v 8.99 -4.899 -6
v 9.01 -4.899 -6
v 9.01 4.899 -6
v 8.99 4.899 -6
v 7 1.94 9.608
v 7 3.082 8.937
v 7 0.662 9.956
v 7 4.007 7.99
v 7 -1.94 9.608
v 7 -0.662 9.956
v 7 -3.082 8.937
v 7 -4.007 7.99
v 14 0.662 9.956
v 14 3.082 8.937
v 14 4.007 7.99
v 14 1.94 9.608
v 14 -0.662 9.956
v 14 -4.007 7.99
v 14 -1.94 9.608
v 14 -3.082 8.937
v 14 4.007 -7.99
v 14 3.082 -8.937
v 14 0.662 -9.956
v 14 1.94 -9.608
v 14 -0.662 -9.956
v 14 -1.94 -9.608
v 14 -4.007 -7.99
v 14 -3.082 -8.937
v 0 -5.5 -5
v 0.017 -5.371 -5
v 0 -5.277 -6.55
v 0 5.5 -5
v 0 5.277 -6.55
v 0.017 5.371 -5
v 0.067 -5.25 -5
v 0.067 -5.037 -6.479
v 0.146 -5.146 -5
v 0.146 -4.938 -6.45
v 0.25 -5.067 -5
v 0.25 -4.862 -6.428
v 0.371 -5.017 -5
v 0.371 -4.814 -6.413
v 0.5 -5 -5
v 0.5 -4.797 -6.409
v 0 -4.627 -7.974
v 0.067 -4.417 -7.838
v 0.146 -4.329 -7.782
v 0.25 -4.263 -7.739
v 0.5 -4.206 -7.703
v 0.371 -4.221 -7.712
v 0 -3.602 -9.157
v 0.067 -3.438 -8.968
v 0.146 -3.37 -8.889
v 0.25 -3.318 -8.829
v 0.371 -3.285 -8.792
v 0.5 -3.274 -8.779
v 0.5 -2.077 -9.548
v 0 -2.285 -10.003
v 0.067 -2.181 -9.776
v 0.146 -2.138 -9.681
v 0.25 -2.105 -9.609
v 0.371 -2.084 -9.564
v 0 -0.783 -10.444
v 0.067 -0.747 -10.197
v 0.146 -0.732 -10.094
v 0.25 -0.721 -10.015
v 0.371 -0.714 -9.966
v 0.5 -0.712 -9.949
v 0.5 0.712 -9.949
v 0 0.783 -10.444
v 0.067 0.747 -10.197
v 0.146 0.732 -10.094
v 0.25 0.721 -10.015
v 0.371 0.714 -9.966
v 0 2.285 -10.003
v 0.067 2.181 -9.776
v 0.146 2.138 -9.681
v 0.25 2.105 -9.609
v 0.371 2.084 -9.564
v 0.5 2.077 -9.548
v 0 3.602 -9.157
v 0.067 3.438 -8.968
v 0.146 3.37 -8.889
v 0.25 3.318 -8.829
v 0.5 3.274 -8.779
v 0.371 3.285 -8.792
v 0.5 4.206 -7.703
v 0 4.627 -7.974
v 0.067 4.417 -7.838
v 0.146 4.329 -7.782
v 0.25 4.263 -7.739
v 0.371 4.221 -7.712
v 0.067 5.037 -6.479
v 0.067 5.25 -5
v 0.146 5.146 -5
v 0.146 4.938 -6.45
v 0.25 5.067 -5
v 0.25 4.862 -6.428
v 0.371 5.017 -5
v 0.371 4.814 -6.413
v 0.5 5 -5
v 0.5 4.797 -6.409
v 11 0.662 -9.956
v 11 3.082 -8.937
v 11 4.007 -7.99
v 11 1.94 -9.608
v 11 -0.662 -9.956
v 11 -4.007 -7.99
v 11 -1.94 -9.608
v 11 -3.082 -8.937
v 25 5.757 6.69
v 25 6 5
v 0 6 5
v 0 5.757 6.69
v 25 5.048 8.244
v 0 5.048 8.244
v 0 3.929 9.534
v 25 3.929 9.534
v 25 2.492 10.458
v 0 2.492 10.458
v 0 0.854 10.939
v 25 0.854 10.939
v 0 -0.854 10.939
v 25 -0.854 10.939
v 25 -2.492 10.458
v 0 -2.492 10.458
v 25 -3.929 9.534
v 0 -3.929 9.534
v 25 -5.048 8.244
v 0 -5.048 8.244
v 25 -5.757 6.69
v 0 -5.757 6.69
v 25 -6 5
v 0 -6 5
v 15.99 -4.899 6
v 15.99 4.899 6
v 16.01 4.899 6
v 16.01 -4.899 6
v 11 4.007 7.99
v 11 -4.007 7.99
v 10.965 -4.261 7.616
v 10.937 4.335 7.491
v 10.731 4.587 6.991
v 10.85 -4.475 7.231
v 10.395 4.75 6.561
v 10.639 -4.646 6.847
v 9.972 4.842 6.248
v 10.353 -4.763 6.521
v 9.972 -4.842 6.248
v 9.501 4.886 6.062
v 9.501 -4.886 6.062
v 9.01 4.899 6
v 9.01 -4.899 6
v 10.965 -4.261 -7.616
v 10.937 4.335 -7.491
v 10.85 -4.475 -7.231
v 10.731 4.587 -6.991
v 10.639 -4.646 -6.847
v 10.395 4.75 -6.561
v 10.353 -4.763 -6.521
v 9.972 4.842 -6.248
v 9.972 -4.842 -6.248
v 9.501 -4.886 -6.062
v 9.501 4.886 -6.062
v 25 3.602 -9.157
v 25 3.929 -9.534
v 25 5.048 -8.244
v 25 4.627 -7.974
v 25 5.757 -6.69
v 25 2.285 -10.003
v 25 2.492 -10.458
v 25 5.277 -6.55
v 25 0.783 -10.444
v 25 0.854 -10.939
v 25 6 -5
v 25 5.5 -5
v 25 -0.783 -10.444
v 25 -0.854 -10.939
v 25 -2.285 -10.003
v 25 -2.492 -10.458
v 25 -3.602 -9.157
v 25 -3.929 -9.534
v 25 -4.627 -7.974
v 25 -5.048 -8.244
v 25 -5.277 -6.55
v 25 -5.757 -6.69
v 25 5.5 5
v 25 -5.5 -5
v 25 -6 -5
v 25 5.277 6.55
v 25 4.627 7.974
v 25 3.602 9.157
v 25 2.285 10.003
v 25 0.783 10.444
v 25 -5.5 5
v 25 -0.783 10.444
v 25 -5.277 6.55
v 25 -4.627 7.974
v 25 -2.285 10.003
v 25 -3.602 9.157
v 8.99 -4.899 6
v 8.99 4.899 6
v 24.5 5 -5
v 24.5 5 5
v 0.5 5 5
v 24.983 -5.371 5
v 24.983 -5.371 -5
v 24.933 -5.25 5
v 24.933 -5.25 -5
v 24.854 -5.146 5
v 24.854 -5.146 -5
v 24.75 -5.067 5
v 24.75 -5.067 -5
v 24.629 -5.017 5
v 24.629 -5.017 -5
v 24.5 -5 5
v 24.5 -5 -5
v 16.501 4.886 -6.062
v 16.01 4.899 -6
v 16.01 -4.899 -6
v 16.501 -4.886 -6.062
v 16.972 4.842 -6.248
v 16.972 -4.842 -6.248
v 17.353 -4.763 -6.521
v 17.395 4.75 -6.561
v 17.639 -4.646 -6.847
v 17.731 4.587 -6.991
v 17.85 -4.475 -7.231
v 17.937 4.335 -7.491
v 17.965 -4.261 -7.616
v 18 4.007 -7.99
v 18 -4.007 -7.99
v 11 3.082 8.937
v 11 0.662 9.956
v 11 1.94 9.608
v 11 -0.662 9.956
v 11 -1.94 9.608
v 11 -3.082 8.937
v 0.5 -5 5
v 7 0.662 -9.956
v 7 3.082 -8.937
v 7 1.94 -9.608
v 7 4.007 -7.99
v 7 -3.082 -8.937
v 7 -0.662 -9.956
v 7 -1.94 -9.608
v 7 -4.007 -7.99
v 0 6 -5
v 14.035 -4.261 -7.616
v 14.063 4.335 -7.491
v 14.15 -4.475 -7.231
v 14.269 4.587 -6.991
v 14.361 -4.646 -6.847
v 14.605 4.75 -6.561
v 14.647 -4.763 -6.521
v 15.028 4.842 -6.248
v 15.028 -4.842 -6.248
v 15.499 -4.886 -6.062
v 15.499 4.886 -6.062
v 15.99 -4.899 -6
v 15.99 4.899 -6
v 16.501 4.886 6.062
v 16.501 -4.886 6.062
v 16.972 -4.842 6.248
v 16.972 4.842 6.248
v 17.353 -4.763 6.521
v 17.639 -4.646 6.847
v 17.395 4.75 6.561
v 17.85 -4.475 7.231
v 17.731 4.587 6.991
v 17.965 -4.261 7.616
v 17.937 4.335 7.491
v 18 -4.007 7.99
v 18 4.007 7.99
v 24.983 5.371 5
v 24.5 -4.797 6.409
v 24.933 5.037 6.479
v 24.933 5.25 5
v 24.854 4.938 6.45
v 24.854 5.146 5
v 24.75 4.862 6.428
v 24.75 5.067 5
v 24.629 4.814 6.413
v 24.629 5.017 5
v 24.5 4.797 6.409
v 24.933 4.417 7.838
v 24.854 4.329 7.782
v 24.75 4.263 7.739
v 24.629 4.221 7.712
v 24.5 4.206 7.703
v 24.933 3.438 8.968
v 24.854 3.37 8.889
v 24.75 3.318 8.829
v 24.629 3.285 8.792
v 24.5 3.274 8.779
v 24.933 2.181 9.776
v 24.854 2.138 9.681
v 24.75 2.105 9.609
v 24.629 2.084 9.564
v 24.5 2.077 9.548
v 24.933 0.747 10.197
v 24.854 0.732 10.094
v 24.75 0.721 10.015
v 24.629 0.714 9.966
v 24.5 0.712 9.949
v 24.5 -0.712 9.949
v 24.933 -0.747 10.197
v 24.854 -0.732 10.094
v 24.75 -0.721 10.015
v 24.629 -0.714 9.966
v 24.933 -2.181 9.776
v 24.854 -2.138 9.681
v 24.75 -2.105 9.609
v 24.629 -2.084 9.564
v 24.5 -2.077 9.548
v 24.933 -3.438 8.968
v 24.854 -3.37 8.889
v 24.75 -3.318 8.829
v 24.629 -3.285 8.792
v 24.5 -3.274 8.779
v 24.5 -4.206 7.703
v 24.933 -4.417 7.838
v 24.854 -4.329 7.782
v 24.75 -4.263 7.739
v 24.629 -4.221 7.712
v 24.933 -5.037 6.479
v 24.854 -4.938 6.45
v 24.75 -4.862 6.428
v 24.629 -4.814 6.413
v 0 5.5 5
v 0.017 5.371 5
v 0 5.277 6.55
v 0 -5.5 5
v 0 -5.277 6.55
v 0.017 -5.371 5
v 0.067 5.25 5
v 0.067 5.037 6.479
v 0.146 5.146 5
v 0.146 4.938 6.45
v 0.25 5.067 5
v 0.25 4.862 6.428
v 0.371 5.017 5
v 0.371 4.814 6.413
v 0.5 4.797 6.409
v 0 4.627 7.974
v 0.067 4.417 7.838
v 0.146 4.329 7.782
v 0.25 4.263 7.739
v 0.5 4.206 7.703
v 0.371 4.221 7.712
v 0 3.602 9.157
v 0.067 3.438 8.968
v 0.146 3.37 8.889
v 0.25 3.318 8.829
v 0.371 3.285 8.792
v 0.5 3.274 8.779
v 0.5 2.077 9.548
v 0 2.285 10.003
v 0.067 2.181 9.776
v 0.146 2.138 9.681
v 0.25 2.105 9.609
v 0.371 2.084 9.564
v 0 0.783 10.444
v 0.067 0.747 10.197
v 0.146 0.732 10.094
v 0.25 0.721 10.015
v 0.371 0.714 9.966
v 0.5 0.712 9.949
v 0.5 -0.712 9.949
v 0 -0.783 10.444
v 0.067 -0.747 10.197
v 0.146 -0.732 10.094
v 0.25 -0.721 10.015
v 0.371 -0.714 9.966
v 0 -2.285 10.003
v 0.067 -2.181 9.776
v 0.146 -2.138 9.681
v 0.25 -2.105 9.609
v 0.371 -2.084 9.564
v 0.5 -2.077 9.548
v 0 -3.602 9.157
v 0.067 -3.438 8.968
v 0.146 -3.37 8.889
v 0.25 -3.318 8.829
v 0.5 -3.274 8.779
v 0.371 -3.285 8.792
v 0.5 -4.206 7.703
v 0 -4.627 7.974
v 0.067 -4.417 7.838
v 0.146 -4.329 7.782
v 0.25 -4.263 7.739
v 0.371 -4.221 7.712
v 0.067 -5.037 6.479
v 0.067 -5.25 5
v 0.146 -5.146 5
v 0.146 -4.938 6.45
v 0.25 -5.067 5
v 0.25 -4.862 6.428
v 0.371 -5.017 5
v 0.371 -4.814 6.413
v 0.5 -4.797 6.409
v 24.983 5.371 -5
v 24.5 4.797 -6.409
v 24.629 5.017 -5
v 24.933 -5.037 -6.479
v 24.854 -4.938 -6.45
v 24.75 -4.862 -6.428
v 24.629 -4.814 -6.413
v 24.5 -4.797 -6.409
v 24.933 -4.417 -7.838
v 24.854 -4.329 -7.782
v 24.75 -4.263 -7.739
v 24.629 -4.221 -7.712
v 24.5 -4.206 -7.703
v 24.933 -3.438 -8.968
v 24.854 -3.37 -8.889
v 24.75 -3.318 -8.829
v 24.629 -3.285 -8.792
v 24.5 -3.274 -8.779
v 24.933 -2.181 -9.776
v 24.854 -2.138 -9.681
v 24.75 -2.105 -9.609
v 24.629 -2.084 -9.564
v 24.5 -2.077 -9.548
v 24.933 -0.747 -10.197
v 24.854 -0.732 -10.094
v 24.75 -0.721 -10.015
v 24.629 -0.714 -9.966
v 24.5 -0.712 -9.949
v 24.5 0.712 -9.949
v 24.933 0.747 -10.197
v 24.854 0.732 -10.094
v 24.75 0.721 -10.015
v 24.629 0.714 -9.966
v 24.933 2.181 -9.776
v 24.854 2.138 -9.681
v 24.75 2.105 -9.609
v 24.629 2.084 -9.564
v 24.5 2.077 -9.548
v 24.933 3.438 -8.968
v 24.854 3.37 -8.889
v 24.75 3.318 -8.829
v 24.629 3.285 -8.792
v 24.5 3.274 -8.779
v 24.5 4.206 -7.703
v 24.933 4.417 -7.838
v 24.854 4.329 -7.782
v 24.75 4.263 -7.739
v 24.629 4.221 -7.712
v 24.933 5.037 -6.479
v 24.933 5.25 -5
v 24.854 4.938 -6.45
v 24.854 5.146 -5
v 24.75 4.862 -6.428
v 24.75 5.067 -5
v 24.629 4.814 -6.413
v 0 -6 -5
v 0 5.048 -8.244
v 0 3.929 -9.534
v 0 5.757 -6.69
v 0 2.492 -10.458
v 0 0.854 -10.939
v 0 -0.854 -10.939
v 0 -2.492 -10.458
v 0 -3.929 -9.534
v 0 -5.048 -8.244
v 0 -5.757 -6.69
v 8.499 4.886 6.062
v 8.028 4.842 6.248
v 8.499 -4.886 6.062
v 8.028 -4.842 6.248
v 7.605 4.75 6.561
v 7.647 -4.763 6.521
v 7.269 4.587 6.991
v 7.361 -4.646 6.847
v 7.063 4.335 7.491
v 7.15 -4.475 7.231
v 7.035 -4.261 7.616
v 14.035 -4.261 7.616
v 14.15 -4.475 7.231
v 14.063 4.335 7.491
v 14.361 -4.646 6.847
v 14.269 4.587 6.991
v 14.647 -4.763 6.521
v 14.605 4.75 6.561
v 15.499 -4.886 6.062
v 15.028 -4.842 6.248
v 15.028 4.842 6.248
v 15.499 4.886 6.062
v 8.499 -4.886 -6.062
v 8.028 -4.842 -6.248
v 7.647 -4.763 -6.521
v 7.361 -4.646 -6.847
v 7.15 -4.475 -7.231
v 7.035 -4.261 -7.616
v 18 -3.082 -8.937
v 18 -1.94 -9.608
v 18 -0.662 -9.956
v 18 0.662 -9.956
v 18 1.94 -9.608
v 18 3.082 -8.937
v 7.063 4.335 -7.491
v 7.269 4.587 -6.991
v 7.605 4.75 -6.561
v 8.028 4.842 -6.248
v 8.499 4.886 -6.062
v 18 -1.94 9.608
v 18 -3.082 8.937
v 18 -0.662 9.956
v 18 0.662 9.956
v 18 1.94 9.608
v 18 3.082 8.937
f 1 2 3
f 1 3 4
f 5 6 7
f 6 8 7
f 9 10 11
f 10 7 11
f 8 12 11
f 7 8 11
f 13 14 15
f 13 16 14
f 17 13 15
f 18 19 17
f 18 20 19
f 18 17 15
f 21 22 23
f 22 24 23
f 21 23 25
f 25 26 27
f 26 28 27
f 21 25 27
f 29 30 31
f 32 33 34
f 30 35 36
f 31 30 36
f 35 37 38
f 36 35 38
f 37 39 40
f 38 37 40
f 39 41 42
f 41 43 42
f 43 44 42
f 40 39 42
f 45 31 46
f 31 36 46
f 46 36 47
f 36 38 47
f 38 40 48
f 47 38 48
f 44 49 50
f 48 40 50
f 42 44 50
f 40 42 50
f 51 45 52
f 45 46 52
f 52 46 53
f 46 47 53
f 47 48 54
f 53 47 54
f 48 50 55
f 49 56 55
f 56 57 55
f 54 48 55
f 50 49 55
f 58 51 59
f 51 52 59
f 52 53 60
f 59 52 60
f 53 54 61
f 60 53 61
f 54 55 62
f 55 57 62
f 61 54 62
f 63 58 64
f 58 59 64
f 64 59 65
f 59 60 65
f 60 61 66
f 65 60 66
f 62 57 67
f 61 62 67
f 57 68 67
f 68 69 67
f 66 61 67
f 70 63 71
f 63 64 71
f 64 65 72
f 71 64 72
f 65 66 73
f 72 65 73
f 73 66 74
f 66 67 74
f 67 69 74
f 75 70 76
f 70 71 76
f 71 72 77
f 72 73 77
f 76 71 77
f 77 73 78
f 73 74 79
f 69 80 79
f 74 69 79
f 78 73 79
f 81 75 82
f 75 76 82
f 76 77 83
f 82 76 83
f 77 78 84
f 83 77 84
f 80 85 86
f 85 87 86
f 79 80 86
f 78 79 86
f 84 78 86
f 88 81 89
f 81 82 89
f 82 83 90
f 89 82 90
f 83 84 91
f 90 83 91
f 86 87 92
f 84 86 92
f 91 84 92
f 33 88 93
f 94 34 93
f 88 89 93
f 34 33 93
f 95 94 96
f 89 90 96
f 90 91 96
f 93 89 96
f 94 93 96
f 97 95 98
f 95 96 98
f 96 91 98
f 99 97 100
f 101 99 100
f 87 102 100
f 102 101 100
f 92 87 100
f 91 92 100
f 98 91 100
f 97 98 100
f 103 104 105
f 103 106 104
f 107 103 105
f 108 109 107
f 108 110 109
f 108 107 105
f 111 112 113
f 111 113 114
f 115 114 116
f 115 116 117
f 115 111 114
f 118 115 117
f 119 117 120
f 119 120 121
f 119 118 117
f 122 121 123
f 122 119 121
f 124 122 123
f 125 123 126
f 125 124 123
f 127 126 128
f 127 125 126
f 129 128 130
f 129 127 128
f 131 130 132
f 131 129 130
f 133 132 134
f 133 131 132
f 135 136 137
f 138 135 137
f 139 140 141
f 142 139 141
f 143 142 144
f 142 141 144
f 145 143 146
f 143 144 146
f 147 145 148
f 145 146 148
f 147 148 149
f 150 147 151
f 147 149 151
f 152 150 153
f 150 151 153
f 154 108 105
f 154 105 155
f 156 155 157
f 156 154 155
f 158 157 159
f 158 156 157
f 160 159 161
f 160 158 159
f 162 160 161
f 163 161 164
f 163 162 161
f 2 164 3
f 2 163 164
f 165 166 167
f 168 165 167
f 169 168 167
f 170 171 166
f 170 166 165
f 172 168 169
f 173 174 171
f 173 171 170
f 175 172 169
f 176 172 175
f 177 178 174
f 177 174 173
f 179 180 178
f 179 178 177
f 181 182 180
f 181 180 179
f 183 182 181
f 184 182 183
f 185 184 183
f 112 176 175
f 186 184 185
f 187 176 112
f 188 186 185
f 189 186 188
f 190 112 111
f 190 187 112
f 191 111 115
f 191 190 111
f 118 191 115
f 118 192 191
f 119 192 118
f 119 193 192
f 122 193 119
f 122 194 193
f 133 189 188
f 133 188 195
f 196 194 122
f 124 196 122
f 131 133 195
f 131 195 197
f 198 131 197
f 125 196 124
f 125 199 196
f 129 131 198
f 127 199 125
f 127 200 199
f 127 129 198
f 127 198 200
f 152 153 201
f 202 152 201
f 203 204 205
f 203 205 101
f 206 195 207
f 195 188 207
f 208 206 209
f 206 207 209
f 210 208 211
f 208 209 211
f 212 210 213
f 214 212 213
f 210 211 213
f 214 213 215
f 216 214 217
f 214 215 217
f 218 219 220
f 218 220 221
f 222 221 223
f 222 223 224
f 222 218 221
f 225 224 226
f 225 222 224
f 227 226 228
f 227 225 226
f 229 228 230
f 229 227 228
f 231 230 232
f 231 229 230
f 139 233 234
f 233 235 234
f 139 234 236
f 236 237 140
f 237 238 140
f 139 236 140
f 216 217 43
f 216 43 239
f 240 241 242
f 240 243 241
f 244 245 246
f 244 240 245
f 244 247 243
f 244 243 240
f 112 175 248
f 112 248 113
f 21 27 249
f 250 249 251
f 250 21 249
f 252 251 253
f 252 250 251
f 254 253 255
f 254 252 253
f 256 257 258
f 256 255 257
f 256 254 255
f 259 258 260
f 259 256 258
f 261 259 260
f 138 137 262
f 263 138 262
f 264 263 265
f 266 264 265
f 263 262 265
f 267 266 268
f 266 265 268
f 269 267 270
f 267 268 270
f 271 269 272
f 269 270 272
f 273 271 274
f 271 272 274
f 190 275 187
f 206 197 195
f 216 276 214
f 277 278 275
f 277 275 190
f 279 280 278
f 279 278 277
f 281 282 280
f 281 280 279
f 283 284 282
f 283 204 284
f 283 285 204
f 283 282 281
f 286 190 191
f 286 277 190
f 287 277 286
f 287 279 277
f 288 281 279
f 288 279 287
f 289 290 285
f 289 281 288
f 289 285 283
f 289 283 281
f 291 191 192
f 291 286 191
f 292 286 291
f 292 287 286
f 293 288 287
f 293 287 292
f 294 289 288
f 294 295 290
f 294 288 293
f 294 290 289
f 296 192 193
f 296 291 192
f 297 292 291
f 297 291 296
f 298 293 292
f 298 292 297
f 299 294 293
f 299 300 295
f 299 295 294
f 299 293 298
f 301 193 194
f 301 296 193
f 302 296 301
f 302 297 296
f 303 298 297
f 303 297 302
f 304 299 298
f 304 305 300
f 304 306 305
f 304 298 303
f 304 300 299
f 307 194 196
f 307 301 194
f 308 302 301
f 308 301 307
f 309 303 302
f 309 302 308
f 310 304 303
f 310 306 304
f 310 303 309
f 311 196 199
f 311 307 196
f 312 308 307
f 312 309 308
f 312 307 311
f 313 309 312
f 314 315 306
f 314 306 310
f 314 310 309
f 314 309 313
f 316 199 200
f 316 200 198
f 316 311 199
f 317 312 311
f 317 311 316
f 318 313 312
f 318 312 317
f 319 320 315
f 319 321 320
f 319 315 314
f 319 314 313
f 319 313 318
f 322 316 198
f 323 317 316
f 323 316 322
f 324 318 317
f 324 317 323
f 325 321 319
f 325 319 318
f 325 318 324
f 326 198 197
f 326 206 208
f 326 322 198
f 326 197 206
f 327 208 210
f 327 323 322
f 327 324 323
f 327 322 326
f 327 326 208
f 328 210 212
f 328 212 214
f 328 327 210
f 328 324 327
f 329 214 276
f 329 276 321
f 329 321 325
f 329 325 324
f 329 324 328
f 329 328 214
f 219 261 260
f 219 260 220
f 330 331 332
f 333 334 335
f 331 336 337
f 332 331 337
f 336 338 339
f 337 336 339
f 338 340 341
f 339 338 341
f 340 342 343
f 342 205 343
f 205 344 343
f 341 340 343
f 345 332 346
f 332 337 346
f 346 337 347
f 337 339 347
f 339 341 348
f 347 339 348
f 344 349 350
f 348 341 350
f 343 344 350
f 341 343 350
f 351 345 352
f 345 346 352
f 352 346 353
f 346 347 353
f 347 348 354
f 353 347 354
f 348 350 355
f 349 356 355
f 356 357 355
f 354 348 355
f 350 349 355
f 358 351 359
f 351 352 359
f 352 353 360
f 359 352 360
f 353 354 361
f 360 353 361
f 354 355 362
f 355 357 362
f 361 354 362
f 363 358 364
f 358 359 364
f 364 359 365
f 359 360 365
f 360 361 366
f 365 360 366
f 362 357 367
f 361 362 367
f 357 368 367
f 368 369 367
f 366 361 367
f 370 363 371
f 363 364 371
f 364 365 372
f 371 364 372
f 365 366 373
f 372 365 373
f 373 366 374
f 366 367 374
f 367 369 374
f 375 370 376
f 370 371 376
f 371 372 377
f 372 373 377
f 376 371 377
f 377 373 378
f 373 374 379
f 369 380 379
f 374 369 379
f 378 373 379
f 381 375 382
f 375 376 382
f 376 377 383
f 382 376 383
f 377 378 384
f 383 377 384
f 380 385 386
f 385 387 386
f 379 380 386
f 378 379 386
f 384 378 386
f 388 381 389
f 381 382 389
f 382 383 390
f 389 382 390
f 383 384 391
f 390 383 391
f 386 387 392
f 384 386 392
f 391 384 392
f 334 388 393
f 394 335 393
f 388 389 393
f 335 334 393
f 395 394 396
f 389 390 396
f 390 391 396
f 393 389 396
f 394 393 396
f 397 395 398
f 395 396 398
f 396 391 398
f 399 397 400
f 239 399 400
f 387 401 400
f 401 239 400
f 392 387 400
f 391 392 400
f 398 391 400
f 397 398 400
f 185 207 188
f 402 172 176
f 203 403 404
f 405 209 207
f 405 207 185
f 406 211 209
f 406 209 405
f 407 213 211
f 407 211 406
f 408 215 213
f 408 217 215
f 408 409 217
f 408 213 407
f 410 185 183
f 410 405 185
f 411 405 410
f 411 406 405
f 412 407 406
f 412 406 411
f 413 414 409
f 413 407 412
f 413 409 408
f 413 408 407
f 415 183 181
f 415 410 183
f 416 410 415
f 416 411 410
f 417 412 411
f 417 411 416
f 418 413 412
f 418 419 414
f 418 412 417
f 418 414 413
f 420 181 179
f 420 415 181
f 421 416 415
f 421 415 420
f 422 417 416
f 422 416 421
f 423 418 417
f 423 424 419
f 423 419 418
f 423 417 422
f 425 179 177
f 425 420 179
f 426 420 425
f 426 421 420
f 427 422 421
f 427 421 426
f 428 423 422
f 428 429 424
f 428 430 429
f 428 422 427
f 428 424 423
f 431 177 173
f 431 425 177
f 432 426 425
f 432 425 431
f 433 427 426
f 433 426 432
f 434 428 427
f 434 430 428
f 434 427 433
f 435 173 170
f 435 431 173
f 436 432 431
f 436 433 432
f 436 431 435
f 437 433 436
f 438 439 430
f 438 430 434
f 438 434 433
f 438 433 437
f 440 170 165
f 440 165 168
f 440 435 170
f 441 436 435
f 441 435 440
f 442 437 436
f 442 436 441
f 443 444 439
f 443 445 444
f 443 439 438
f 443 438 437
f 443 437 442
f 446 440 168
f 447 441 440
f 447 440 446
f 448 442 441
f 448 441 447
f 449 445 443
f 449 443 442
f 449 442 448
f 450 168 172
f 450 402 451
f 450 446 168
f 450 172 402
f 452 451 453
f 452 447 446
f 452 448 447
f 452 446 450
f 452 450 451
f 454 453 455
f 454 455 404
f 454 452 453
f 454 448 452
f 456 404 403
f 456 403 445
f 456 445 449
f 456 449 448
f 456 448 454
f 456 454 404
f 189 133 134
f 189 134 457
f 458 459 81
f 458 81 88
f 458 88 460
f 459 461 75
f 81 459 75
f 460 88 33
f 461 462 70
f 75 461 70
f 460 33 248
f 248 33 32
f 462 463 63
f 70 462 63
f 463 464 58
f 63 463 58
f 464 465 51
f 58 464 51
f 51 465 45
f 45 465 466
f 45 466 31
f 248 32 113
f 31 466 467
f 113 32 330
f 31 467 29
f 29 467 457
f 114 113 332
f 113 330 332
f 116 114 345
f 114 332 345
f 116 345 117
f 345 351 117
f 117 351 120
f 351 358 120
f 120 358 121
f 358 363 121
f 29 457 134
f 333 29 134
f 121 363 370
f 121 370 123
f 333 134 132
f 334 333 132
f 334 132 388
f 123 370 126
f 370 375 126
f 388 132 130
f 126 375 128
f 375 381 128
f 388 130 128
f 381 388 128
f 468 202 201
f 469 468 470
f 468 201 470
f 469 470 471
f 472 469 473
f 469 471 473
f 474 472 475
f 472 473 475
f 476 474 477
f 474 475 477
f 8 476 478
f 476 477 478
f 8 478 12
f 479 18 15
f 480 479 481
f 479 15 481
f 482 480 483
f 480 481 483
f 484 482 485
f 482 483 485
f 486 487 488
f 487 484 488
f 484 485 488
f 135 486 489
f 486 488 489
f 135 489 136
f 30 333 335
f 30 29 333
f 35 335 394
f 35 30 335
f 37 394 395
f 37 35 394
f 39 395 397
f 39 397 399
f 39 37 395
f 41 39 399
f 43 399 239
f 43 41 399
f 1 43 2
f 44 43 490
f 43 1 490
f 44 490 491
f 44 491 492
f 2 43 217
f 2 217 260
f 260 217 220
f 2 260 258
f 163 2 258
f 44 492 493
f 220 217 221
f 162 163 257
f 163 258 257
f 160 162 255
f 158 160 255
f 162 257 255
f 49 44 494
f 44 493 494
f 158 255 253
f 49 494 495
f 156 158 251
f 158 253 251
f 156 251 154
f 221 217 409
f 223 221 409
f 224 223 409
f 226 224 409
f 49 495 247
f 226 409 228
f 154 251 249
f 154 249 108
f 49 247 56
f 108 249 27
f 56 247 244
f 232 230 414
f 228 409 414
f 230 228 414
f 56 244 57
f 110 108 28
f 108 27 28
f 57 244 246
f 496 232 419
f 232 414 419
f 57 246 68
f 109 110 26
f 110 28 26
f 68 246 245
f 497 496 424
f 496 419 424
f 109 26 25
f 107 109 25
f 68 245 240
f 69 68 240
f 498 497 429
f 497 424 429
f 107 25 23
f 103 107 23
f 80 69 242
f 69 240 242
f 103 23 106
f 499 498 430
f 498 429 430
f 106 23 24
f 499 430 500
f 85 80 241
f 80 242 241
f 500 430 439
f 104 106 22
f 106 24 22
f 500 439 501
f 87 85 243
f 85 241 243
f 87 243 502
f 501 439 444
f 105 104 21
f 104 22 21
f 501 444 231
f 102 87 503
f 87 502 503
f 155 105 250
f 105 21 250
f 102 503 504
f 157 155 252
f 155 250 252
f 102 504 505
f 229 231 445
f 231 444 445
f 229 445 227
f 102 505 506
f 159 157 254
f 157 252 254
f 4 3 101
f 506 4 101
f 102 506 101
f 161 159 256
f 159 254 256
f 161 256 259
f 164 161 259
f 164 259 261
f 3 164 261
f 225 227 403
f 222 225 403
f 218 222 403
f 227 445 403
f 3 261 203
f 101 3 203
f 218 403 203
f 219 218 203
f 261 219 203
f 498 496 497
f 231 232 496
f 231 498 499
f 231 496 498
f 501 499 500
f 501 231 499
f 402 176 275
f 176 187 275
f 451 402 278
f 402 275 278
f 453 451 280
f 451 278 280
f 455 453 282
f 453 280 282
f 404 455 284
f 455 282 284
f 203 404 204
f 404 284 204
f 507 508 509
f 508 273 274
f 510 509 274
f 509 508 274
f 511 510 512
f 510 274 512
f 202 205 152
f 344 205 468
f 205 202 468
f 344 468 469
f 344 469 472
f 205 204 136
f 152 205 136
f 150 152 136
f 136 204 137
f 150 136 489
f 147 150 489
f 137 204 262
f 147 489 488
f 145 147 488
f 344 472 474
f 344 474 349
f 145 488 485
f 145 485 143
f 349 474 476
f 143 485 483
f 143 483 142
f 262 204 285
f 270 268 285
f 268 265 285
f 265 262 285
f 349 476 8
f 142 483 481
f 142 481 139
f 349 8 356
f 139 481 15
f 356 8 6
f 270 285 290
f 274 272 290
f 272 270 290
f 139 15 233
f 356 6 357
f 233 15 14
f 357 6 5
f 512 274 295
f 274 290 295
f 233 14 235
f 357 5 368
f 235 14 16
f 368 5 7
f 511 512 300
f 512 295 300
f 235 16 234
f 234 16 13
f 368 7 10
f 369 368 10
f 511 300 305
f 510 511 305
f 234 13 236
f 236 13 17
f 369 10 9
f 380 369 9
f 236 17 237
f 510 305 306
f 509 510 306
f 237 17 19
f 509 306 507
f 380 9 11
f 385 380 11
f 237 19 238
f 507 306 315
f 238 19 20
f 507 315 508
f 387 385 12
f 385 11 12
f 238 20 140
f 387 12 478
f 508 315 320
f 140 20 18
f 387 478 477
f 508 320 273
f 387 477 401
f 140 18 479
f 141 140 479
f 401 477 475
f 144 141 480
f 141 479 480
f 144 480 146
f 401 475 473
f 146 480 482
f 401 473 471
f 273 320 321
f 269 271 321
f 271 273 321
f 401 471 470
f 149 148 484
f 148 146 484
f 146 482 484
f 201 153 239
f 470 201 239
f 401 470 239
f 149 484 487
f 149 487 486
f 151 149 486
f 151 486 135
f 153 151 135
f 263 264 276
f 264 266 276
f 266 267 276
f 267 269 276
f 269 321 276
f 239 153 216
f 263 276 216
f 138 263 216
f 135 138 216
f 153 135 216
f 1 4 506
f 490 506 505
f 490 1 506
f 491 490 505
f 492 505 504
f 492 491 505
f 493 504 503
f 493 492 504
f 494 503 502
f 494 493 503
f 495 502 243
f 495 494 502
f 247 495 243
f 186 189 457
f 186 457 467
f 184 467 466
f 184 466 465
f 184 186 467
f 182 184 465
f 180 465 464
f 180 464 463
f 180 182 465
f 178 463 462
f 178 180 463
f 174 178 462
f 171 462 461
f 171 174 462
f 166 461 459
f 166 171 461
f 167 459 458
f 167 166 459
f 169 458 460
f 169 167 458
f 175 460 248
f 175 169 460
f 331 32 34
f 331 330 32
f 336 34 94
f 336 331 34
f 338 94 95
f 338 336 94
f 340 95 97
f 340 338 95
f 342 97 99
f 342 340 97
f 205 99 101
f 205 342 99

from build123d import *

# Parameters (mm, degrees)
FILLET1_R                       = 0.5
BOSS_EXTRUDE6_REACH             = 29.964
BOSS_EXTRUDE6_DIRECTION_2_REACH = 29.964
MIRROR2_COPY_1_REACH            = 29.964
MIRROR2_COPY_2_REACH            = 29.964
MIRROR2_COPY_3_REACH            = 29.964
MIRROR2_COPY_4_REACH            = 29.964


with BuildPart() as part:
    # Sweep1: sweep along a path in Sketch2path
    with BuildLine(Plane.XY) as sweep1_path:
        Line((0, 0), (25, 0))
    # Sketch3 → Sweep1 (sweep)
    with BuildSketch(Plane(origin=(0, 0, 0), x_dir=(0, 0, -1), z_dir=(1, 0, 0))):
        with BuildLine():
            Line((-5, 6), (5, 6))
            ThreePointArc((5, 6), (11, 0), (5, -6))
            Line((5, -6), (-5, -6))
            ThreePointArc((-5, -6), (-11, 0), (-5, 6))
        make_face()
        with BuildLine():
            Line((-5, 5), (5, 5))
            ThreePointArc((5, 5), (10, 0), (5, -5))
            Line((5, -5), (-5, -5))
            ThreePointArc((-5, -5), (-10, 0), (-5, 5))
        make_face(mode=Mode.SUBTRACT)
    sweep(path=sweep1_path.line)

    # Fillet1
    fillet1_edges = [part.edges().sort_by_distance(p)[0] for p in [
        (25, 0, -10),
        (25, -5, 0),
        (25, 0, 10),
        (0, 0, 10),
        (0, 5, 0),
        (0, 0, -10),
        (25, 5, 0),
        (0, -5, 0),
    ]]
    fillet(fillet1_edges, radius=FILLET1_R)

    # Sketch13 → Boss-Extrude6 (add, up to next)
    with BuildSketch(Plane(origin=(0, 0, 0), x_dir=(1, 0, 0), z_dir=(0, 1, 0)), mode=Mode.PRIVATE) as boss_extrude6_sk1:
        with BuildLine():
            Line((15.99, -6), (16.01, -6))
            ThreePointArc((16.01, -6), (17.417142495, -6.582857505), (18, -7.99))
            Line((18, -7.99), (18, -10))
            Line((18, -10), (14, -10))
            Line((14, -10), (14, -7.99))
            ThreePointArc((14, -7.99), (14.582857505, -6.582857505), (15.99, -6))
        make_face()
    boss_extrude6_tool1 = extrude(boss_extrude6_sk1.sketch, amount=BOSS_EXTRUDE6_REACH, mode=Mode.PRIVATE) - part.part
    boss_extrude6 = boss_extrude6_tool1.solids().sort_by_distance((16, 0, 8.184882))[0]
    add(boss_extrude6)

    # Sketch13 → Boss-Extrude6 direction 2 (add, up to next)
    with BuildSketch(Plane(origin=(0, 0, 0), x_dir=(1, 0, 0), z_dir=(0, 1, 0)), mode=Mode.PRIVATE) as boss_extrude6_direction_2_sk1:
        with BuildLine():
            Line((15.99, -6), (16.01, -6))
            ThreePointArc((16.01, -6), (17.417142495, -6.582857505), (18, -7.99))
            Line((18, -7.99), (18, -10))
            Line((18, -10), (14, -10))
            Line((14, -10), (14, -7.99))
            ThreePointArc((14, -7.99), (14.582857505, -6.582857505), (15.99, -6))
        make_face()
    boss_extrude6_direction_2_tool1 = extrude(boss_extrude6_direction_2_sk1.sketch, amount=-BOSS_EXTRUDE6_DIRECTION_2_REACH, mode=Mode.PRIVATE) - part.part
    boss_extrude6_direction_2 = boss_extrude6_direction_2_tool1.solids().sort_by_distance((16, 0, 8.184882))[0]
    add(boss_extrude6_direction_2)

    # Mirror1: Boss-Extrude6, Boss-Extrude6 direction 2 across plane
    add(boss_extrude6.mirror(Plane(origin=(12.5, 0, 0), x_dir=(0, 0, 1), z_dir=(1, 0, 0))))
    add(boss_extrude6_direction_2.mirror(Plane(origin=(12.5, 0, 0), x_dir=(0, 0, 1), z_dir=(1, 0, 0))))

    # Mirror2 copy 1 sketch → Mirror2 copy 1 (add, up to next)
    with BuildSketch(Plane(origin=(25, 0, 0), x_dir=(-1, 0, 0), z_dir=(0, 1, 0)), mode=Mode.PRIVATE) as mirror2_copy_1_sk1:
        with BuildLine():
            Line((15.99, -6), (16.01, -6))
            ThreePointArc((16.01, -6), (17.417142495, -6.582857505), (18, -7.99))
            Line((18, -7.99), (18, -10))
            Line((18, -10), (14, -10))
            Line((14, -10), (14, -7.99))
            ThreePointArc((14, -7.99), (14.582857505, -6.582857505), (15.99, -6))
        make_face()
    mirror2_copy_1_tool1 = extrude(mirror2_copy_1_sk1.sketch, amount=MIRROR2_COPY_1_REACH, mode=Mode.PRIVATE) - part.part
    add(mirror2_copy_1_tool1.solids().sort_by_distance((9, 0, -8.184882))[0])

    # Mirror2 copy 2 sketch → Mirror2 copy 2 (add, up to next)
    with BuildSketch(Plane(origin=(25, 0, 0), x_dir=(-1, 0, 0), z_dir=(0, 1, 0)), mode=Mode.PRIVATE) as mirror2_copy_2_sk1:
        with BuildLine():
            Line((15.99, -6), (16.01, -6))
            ThreePointArc((16.01, -6), (17.417142495, -6.582857505), (18, -7.99))
            Line((18, -7.99), (18, -10))
            Line((18, -10), (14, -10))
            Line((14, -10), (14, -7.99))
            ThreePointArc((14, -7.99), (14.582857505, -6.582857505), (15.99, -6))
        make_face()
    mirror2_copy_2_tool1 = extrude(mirror2_copy_2_sk1.sketch, amount=-MIRROR2_COPY_2_REACH, mode=Mode.PRIVATE) - part.part
    add(mirror2_copy_2_tool1.solids().sort_by_distance((9, 0, -8.184882))[0])

    # Mirror2 copy 3 sketch → Mirror2 copy 3 (add, up to next)
    with BuildSketch(Plane(origin=(0, 0, 0), x_dir=(1, 0, 0), z_dir=(0, 1, 0)), mode=Mode.PRIVATE) as mirror2_copy_3_sk1:
        with BuildLine():
            Line((15.99, 6), (16.01, 6))
            ThreePointArc((16.01, 6), (17.417142495, 6.582857505), (18, 7.99))
            Line((18, 7.99), (18, 10))
            Line((18, 10), (14, 10))
            Line((14, 10), (14, 7.99))
            ThreePointArc((14, 7.99), (14.582857505, 6.582857505), (15.99, 6))
        make_face()
    mirror2_copy_3_tool1 = extrude(mirror2_copy_3_sk1.sketch, amount=MIRROR2_COPY_3_REACH, mode=Mode.PRIVATE) - part.part
    add(mirror2_copy_3_tool1.solids().sort_by_distance((16, 0, -8.184882))[0])

    # Mirror2 copy 4 sketch → Mirror2 copy 4 (add, up to next)
    with BuildSketch(Plane(origin=(0, 0, 0), x_dir=(1, 0, 0), z_dir=(0, 1, 0)), mode=Mode.PRIVATE) as mirror2_copy_4_sk1:
        with BuildLine():
            Line((15.99, 6), (16.01, 6))
            ThreePointArc((16.01, 6), (17.417142495, 6.582857505), (18, 7.99))
            Line((18, 7.99), (18, 10))
            Line((18, 10), (14, 10))
            Line((14, 10), (14, 7.99))
            ThreePointArc((14, 7.99), (14.582857505, 6.582857505), (15.99, 6))
        make_face()
    mirror2_copy_4_tool1 = extrude(mirror2_copy_4_sk1.sketch, amount=-MIRROR2_COPY_4_REACH, mode=Mode.PRIVATE) - part.part
    add(mirror2_copy_4_tool1.solids().sort_by_distance((16, 0, -8.184882))[0])


solid = part.part
